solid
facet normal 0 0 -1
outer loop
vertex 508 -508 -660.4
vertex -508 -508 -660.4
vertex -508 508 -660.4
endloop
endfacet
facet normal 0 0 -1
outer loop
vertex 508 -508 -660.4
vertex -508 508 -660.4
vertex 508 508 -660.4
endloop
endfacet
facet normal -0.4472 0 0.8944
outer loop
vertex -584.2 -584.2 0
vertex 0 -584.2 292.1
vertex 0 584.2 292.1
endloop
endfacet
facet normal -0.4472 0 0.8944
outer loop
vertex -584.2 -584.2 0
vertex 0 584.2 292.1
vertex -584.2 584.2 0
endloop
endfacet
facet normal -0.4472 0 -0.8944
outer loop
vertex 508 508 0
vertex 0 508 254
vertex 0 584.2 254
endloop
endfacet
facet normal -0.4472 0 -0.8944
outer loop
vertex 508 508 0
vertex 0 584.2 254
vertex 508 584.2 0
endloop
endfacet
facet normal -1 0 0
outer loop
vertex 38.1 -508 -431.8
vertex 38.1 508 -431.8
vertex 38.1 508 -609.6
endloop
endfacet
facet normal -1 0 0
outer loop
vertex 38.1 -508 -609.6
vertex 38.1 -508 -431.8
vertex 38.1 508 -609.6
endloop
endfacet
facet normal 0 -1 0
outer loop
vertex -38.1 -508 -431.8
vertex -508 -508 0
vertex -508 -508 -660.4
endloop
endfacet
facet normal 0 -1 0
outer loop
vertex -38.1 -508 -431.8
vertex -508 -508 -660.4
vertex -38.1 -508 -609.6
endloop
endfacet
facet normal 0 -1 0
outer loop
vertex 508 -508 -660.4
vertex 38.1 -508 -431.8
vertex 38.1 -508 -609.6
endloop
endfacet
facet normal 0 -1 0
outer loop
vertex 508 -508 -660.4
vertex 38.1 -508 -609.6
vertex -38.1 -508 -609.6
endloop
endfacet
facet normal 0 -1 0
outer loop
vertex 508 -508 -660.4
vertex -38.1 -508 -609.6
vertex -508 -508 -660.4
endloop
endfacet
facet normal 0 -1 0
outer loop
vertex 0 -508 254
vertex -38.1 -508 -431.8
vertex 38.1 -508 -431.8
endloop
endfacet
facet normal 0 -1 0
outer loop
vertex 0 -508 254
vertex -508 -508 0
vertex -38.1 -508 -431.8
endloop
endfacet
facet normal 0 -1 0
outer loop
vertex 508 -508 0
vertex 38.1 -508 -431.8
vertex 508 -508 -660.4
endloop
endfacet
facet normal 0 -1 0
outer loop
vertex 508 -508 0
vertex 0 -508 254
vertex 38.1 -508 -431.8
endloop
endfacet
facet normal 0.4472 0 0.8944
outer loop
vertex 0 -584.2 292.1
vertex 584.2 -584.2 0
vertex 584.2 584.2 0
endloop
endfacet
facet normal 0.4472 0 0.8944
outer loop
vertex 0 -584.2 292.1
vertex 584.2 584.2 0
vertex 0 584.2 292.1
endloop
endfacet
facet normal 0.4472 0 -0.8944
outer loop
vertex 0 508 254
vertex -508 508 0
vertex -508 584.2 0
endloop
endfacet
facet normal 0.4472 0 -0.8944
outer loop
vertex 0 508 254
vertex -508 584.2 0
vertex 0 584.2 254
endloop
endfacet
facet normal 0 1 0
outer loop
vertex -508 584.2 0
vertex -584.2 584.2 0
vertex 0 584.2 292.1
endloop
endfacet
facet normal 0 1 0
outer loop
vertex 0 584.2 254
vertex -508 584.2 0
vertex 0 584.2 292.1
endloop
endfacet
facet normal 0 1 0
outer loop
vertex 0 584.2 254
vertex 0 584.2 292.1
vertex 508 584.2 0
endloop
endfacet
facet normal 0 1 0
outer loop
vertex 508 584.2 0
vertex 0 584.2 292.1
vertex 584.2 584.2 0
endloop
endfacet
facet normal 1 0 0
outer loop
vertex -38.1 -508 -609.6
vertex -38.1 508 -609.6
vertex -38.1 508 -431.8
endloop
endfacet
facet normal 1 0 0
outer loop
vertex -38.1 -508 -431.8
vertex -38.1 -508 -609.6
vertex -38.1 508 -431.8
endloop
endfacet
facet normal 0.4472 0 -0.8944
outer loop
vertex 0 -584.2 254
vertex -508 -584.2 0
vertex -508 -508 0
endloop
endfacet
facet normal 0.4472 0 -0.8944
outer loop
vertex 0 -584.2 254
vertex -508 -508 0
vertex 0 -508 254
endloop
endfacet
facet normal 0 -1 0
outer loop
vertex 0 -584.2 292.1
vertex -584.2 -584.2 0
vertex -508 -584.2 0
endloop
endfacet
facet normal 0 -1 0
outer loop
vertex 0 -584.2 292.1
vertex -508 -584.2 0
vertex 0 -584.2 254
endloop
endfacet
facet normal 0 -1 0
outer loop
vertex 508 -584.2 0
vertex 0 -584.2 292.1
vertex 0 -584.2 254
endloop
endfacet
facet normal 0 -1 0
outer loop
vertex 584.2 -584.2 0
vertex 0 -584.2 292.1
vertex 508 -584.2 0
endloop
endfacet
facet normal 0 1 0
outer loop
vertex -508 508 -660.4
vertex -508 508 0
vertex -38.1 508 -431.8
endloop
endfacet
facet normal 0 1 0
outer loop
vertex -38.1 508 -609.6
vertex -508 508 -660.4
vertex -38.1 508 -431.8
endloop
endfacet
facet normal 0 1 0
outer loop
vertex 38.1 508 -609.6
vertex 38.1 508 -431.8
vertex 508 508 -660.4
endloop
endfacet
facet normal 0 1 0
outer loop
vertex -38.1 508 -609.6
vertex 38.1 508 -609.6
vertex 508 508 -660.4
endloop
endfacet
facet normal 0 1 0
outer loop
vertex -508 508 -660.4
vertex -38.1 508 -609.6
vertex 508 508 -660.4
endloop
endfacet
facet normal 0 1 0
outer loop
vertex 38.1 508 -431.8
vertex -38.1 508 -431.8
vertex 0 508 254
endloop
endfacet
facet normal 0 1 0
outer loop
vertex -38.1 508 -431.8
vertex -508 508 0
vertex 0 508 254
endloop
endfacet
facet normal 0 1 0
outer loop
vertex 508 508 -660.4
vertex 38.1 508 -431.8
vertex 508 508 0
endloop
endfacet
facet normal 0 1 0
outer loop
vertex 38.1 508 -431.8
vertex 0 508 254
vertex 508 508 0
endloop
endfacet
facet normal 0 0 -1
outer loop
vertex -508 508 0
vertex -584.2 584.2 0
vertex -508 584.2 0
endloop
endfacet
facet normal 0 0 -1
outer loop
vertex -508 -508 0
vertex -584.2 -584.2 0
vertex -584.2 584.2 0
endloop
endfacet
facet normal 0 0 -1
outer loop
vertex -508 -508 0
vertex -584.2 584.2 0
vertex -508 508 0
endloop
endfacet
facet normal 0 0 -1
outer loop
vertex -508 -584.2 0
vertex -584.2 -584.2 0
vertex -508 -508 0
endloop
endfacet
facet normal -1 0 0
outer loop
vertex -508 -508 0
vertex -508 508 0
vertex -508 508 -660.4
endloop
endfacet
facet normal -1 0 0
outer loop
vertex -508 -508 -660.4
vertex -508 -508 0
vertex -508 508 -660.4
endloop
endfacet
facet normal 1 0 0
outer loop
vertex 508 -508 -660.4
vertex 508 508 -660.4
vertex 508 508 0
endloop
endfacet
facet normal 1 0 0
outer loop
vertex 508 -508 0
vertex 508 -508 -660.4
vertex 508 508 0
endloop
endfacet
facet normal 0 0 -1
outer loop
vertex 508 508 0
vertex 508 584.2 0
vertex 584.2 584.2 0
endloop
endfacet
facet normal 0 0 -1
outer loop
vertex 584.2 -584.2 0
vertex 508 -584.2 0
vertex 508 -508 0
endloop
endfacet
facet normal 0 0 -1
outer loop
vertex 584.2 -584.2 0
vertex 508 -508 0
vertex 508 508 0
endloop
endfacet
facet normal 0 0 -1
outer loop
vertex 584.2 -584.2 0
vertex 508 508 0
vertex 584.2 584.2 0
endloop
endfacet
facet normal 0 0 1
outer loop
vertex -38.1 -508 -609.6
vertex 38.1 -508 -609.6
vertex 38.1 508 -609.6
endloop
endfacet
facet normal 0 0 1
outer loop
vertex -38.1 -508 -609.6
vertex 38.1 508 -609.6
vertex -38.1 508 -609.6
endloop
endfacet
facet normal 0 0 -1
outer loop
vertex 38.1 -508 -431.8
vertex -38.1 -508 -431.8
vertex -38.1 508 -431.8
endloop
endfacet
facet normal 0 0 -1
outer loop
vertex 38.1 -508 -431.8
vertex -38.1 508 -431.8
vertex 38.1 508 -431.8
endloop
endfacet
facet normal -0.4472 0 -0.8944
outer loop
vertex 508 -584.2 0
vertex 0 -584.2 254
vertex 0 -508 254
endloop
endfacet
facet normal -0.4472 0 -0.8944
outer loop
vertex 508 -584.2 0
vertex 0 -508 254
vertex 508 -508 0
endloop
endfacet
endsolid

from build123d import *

# Parameters (mm, degrees)
F1_DEPTH = 584.2
F0_W     = 469.9
F0_H     = 50.8
F2_DEPTH = 508


with BuildPart() as f1:
    # F0 (on Front) → F1 (new body, symmetric)
    with BuildSketch(Plane.XZ):
        Polygon((-584.2, 0), (-508, 0), (0, 254), (0, 292.1), align=None)
        Polygon((0, 254), (508, 0), (584.2, 0), (0, 292.1), align=None)
    extrude(amount=F1_DEPTH, both=True)

    # F0 (on Front) → F2 (join, symmetric)
    with BuildSketch(Plane.XZ):
        Polygon((508, 0), (0, 0), (-508, 0), (-508, -609.6), (-38.1, -609.6), (-38.1, -431.8), (38.1, -431.8), (38.1, -609.6), (508, -609.6), align=None)
        Polygon((0, 254), (0, 0), (508, 0), align=None)
        Polygon((-508, 0), (0, 0), (0, 254), align=None)
        Polygon((-584.2, 0), (-508, 0), (0, 254), (0, 292.1), align=None)
        Polygon((0, 254), (508, 0), (584.2, 0), (0, 292.1), align=None)
        with Locations((-273.05, -635)):
            Rectangle(F0_W, F0_H)
        with Locations((273.05, -635)):
            Rectangle(F0_W, F0_H)
        Polygon((0, -609.6), (-38.1, -609.6), (-38.1, -660.4), (38.1, -660.4), (38.1, -609.6), align=None)
    extrude(amount=F2_DEPTH, both=True)


solid = f1.part
